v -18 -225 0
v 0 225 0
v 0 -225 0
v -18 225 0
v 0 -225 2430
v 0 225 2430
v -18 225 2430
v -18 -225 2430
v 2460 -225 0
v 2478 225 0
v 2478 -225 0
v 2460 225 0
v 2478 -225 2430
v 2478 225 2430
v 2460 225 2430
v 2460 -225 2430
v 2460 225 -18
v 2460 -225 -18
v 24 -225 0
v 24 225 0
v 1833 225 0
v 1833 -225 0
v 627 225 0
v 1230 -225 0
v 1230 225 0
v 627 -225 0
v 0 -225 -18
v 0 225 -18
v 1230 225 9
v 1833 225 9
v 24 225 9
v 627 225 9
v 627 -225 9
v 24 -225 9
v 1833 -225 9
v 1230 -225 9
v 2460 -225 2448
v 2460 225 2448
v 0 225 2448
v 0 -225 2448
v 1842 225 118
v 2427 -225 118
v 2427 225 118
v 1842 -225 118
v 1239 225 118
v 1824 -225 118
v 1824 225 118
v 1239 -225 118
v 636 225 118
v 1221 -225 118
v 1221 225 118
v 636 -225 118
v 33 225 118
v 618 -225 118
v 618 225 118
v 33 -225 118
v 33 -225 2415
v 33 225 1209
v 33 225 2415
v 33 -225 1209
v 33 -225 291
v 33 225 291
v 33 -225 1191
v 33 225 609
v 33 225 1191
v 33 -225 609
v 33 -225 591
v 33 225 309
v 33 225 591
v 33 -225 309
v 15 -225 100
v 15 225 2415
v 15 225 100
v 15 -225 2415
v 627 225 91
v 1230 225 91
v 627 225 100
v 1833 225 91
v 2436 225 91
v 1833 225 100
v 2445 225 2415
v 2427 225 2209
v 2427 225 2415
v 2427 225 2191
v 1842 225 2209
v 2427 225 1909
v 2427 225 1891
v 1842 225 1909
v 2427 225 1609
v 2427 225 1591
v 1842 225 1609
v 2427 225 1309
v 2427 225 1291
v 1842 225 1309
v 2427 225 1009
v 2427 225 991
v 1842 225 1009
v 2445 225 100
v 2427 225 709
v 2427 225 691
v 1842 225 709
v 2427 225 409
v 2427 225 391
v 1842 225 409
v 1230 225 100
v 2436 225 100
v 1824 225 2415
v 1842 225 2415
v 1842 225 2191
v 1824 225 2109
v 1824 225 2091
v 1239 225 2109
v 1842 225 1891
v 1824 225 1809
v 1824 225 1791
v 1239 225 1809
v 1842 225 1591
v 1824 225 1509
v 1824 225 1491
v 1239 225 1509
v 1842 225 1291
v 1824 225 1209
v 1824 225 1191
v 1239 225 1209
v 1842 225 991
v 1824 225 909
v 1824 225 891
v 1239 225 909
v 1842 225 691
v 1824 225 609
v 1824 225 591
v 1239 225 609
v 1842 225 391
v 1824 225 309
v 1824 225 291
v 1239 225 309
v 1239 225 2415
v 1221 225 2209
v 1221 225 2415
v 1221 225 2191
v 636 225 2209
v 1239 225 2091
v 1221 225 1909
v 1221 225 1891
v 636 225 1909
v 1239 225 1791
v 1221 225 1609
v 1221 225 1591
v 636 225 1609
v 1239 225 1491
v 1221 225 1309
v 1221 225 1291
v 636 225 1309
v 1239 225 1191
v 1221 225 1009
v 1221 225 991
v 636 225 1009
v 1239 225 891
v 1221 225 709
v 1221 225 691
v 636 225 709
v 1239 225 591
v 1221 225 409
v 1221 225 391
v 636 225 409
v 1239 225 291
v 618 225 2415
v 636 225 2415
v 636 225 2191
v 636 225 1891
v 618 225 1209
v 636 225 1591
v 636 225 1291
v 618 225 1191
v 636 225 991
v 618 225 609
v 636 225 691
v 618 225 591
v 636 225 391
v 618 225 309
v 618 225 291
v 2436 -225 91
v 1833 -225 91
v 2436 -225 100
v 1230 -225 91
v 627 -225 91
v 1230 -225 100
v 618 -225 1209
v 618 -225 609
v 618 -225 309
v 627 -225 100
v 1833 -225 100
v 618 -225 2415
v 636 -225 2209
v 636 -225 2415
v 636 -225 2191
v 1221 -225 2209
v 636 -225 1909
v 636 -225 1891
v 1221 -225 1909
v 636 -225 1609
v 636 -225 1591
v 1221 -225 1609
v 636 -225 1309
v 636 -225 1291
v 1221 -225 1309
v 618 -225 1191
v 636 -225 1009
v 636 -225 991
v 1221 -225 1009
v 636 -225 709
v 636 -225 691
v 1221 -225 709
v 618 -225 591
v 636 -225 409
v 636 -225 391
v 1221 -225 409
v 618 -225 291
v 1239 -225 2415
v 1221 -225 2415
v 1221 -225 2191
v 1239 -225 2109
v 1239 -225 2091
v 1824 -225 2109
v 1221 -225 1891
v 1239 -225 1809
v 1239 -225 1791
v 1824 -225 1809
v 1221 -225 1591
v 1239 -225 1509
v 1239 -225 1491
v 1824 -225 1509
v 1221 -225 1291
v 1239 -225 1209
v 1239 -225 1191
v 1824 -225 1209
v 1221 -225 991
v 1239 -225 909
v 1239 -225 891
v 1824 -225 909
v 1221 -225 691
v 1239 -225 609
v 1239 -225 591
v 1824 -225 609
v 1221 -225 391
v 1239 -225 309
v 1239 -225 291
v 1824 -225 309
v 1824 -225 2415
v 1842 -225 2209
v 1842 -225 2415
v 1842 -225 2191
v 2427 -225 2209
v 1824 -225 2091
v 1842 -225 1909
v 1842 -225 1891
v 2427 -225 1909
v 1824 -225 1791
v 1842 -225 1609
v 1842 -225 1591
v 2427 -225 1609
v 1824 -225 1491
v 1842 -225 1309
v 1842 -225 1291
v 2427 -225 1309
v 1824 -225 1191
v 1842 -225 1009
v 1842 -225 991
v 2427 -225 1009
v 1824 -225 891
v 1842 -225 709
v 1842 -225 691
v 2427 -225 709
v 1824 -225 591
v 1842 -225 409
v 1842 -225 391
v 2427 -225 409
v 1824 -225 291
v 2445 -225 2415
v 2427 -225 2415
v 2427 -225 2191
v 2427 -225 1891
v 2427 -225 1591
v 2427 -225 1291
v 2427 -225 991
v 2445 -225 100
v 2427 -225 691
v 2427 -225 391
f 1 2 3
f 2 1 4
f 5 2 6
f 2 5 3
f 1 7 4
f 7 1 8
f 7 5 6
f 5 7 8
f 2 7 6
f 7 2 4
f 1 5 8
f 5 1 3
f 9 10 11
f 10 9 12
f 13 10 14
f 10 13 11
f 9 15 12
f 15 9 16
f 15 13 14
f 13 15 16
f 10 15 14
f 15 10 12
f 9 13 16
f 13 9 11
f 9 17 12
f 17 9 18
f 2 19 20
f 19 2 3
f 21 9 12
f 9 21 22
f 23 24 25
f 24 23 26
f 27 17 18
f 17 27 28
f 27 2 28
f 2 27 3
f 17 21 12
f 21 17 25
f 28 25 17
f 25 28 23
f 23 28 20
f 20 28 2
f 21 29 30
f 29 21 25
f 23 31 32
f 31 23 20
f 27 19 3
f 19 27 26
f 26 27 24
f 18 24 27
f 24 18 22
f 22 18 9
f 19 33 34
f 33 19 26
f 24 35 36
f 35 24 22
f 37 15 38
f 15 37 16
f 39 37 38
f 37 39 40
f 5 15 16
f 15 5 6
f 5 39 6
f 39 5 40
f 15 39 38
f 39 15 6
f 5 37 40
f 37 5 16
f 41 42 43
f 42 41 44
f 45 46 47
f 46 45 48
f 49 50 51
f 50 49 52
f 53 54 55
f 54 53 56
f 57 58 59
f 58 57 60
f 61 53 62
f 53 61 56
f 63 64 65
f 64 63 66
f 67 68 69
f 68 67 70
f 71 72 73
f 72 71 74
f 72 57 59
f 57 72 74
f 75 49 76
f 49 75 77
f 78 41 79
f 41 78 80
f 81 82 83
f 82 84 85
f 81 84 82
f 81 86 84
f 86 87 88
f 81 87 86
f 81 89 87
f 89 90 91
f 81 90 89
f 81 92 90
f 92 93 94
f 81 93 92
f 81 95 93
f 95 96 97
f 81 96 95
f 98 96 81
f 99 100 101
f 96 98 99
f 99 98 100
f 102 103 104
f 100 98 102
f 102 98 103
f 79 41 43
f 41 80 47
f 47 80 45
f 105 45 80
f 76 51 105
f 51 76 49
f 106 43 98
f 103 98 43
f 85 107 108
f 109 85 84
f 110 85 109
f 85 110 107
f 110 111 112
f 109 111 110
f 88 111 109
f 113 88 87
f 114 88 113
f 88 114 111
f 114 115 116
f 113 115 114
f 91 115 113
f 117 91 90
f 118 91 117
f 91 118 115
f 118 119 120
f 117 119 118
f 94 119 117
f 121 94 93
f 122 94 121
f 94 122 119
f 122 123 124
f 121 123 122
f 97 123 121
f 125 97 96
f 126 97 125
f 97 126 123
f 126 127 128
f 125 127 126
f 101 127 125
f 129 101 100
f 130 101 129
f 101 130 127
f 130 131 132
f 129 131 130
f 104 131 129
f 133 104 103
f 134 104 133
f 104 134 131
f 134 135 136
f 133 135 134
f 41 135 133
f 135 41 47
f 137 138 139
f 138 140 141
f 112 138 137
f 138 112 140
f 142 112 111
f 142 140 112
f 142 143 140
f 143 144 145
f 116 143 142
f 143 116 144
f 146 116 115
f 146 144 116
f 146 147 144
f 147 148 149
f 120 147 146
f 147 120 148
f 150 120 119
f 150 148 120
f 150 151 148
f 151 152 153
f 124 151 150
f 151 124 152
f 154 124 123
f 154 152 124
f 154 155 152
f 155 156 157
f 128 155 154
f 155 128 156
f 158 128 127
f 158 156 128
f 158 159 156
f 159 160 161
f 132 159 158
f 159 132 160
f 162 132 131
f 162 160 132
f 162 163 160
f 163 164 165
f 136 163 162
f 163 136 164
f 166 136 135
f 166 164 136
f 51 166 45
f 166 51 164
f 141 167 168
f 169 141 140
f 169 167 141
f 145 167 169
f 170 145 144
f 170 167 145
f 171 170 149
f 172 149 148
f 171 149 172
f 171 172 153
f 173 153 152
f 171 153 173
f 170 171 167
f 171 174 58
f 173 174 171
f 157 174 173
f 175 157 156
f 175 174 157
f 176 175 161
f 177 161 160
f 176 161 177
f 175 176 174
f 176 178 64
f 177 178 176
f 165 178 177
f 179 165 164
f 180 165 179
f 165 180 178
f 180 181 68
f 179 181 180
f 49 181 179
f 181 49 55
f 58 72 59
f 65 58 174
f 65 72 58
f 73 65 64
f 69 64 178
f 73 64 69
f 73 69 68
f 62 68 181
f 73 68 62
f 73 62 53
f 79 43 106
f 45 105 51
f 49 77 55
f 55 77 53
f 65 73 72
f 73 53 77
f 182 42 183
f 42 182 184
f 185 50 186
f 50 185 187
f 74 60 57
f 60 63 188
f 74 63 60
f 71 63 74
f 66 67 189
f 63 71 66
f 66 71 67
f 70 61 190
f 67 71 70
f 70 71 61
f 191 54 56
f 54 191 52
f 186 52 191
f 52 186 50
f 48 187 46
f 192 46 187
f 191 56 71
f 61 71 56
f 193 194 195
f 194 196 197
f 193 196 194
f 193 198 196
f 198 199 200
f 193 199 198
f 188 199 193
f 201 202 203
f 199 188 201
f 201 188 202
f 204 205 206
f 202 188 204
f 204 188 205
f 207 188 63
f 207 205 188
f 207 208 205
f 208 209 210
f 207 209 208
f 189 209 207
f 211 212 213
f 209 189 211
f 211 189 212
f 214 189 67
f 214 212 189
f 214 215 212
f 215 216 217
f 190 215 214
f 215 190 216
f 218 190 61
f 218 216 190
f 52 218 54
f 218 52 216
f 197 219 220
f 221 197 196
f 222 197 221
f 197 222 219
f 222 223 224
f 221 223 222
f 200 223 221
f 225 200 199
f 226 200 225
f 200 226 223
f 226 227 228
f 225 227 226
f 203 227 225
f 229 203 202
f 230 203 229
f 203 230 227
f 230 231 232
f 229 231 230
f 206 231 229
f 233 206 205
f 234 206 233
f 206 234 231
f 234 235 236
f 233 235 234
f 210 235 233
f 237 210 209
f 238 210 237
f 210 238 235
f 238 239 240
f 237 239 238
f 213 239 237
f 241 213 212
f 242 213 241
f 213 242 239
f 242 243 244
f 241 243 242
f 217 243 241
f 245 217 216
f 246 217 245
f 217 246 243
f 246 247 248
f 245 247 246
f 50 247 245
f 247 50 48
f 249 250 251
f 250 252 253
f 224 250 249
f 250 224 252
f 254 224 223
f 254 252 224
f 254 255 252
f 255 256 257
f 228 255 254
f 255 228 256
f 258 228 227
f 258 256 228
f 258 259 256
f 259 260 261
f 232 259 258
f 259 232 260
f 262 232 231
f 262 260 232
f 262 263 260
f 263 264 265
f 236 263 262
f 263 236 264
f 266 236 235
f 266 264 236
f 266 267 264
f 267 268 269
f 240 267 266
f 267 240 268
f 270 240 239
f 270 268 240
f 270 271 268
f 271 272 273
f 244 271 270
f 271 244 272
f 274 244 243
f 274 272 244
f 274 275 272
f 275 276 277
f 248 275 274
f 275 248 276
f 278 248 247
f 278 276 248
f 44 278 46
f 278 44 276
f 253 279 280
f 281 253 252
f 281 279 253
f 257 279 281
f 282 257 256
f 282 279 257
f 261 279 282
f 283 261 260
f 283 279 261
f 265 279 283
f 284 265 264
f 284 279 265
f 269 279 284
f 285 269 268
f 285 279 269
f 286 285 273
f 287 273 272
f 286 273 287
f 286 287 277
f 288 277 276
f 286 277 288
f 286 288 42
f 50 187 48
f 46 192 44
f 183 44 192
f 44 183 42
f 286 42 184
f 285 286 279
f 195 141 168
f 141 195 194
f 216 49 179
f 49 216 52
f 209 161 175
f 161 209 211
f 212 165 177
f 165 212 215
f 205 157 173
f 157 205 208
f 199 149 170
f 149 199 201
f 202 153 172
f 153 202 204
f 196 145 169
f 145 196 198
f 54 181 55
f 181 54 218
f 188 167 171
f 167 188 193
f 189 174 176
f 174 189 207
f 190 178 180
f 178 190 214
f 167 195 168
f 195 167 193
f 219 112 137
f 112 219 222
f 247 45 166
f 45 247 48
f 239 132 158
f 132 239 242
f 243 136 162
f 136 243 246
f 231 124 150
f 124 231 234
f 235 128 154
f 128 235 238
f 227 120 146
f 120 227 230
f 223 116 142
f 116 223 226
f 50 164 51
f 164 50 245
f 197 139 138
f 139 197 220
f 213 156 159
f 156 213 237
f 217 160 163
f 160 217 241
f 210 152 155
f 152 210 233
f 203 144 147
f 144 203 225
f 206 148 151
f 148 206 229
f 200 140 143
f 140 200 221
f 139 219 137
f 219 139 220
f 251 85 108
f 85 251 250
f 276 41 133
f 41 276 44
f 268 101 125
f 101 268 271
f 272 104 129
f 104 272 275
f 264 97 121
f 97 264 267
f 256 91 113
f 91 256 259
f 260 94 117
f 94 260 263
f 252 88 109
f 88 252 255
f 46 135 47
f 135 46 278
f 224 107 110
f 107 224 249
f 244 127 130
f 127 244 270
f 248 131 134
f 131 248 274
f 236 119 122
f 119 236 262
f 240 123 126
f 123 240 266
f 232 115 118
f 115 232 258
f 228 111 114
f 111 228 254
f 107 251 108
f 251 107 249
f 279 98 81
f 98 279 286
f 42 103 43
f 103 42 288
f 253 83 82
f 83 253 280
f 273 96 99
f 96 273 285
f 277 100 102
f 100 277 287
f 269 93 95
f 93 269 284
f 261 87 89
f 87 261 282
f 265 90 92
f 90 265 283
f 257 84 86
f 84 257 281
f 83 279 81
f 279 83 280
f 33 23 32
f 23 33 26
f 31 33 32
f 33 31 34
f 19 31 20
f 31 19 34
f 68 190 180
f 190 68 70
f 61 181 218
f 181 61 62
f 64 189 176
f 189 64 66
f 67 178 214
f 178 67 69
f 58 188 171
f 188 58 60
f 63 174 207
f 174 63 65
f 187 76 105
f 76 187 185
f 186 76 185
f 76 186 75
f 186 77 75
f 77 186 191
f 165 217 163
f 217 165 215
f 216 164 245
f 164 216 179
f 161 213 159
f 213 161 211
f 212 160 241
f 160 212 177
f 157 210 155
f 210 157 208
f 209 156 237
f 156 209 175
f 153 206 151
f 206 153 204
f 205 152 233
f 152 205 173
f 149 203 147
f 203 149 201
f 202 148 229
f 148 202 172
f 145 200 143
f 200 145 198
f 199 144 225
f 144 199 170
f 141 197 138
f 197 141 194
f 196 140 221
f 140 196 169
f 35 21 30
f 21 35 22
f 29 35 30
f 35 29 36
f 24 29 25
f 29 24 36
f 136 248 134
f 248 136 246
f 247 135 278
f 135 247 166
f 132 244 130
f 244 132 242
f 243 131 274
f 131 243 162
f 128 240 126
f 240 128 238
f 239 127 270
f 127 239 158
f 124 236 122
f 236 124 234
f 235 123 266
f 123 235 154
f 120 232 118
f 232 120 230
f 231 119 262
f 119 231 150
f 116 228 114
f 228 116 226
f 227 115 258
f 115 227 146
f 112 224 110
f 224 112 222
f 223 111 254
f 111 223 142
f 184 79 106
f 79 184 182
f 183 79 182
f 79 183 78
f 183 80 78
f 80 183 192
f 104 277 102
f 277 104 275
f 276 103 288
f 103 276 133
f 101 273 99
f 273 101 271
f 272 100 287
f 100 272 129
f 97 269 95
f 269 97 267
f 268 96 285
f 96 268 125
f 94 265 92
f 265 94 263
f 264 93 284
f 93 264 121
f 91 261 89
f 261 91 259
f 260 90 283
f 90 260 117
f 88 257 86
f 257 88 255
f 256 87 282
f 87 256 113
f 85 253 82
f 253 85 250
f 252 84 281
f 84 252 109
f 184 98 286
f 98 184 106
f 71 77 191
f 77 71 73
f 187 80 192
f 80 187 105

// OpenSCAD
open_x = 2460;
open_y = 2430;
margin_x = 15;
margin_y = 15;
columns = 5;
th = 18;
wd = 450;
base = 100;
f2b = base + th;
offset_x = margin_x + th/2;
diff_x = (open_x - 2*offset_x)/(columns - 1);
st = [for (x = [0 : columns - 1]) offset_x + x*diff_x];
c1 = [0, 300, 600, 1200];
c2 = [for (z = [0 : 7]) 100 + z*300];
c3 = [for (z = [0 : 7]) z*300];
c4 = c2;

module plank(l) {
    echo("plank l =", l);
    cube([l, wd, th], center = true);
}

module standing_plank(l) {
    rotate([0, 90, 0]) plank(l);
}

module section(s, c) {
    // Create shelves in column 1
    let ( x = st[s]
        , w = st[s + 1] - st[s] )
    translate([x + w/2, 0, 0])
    for(i = c)
        translate([0, 0, i])
        plank(w);
}
// Opening
color("gray", 0.5)
union() {
    translate([-th/2, 0, open_y/2])
        standing_plank(open_y);
    translate([th/2 + open_x, 0, open_y/2])
        standing_plank(open_y);
    translate([open_x/2, 0, -th/2])
        plank(open_x);
    translate([open_x/2, 0, open_y + th/2])
        plank(open_x);
}

// Create columns
let (l = open_y - margin_y - f2b)
translate([0, 0, l/2 + f2b])
for(i = st)
    translate([i, 0, 0])
    standing_plank(l);

// Create base
let (w = open_x - 2*margin_x)
    translate([w/2 + margin_x, 0, base + th/2])
    plank(w);

// Create shelves
section(0, c1);
section(1, c2);
section(2, c3);
section(3, c4);
